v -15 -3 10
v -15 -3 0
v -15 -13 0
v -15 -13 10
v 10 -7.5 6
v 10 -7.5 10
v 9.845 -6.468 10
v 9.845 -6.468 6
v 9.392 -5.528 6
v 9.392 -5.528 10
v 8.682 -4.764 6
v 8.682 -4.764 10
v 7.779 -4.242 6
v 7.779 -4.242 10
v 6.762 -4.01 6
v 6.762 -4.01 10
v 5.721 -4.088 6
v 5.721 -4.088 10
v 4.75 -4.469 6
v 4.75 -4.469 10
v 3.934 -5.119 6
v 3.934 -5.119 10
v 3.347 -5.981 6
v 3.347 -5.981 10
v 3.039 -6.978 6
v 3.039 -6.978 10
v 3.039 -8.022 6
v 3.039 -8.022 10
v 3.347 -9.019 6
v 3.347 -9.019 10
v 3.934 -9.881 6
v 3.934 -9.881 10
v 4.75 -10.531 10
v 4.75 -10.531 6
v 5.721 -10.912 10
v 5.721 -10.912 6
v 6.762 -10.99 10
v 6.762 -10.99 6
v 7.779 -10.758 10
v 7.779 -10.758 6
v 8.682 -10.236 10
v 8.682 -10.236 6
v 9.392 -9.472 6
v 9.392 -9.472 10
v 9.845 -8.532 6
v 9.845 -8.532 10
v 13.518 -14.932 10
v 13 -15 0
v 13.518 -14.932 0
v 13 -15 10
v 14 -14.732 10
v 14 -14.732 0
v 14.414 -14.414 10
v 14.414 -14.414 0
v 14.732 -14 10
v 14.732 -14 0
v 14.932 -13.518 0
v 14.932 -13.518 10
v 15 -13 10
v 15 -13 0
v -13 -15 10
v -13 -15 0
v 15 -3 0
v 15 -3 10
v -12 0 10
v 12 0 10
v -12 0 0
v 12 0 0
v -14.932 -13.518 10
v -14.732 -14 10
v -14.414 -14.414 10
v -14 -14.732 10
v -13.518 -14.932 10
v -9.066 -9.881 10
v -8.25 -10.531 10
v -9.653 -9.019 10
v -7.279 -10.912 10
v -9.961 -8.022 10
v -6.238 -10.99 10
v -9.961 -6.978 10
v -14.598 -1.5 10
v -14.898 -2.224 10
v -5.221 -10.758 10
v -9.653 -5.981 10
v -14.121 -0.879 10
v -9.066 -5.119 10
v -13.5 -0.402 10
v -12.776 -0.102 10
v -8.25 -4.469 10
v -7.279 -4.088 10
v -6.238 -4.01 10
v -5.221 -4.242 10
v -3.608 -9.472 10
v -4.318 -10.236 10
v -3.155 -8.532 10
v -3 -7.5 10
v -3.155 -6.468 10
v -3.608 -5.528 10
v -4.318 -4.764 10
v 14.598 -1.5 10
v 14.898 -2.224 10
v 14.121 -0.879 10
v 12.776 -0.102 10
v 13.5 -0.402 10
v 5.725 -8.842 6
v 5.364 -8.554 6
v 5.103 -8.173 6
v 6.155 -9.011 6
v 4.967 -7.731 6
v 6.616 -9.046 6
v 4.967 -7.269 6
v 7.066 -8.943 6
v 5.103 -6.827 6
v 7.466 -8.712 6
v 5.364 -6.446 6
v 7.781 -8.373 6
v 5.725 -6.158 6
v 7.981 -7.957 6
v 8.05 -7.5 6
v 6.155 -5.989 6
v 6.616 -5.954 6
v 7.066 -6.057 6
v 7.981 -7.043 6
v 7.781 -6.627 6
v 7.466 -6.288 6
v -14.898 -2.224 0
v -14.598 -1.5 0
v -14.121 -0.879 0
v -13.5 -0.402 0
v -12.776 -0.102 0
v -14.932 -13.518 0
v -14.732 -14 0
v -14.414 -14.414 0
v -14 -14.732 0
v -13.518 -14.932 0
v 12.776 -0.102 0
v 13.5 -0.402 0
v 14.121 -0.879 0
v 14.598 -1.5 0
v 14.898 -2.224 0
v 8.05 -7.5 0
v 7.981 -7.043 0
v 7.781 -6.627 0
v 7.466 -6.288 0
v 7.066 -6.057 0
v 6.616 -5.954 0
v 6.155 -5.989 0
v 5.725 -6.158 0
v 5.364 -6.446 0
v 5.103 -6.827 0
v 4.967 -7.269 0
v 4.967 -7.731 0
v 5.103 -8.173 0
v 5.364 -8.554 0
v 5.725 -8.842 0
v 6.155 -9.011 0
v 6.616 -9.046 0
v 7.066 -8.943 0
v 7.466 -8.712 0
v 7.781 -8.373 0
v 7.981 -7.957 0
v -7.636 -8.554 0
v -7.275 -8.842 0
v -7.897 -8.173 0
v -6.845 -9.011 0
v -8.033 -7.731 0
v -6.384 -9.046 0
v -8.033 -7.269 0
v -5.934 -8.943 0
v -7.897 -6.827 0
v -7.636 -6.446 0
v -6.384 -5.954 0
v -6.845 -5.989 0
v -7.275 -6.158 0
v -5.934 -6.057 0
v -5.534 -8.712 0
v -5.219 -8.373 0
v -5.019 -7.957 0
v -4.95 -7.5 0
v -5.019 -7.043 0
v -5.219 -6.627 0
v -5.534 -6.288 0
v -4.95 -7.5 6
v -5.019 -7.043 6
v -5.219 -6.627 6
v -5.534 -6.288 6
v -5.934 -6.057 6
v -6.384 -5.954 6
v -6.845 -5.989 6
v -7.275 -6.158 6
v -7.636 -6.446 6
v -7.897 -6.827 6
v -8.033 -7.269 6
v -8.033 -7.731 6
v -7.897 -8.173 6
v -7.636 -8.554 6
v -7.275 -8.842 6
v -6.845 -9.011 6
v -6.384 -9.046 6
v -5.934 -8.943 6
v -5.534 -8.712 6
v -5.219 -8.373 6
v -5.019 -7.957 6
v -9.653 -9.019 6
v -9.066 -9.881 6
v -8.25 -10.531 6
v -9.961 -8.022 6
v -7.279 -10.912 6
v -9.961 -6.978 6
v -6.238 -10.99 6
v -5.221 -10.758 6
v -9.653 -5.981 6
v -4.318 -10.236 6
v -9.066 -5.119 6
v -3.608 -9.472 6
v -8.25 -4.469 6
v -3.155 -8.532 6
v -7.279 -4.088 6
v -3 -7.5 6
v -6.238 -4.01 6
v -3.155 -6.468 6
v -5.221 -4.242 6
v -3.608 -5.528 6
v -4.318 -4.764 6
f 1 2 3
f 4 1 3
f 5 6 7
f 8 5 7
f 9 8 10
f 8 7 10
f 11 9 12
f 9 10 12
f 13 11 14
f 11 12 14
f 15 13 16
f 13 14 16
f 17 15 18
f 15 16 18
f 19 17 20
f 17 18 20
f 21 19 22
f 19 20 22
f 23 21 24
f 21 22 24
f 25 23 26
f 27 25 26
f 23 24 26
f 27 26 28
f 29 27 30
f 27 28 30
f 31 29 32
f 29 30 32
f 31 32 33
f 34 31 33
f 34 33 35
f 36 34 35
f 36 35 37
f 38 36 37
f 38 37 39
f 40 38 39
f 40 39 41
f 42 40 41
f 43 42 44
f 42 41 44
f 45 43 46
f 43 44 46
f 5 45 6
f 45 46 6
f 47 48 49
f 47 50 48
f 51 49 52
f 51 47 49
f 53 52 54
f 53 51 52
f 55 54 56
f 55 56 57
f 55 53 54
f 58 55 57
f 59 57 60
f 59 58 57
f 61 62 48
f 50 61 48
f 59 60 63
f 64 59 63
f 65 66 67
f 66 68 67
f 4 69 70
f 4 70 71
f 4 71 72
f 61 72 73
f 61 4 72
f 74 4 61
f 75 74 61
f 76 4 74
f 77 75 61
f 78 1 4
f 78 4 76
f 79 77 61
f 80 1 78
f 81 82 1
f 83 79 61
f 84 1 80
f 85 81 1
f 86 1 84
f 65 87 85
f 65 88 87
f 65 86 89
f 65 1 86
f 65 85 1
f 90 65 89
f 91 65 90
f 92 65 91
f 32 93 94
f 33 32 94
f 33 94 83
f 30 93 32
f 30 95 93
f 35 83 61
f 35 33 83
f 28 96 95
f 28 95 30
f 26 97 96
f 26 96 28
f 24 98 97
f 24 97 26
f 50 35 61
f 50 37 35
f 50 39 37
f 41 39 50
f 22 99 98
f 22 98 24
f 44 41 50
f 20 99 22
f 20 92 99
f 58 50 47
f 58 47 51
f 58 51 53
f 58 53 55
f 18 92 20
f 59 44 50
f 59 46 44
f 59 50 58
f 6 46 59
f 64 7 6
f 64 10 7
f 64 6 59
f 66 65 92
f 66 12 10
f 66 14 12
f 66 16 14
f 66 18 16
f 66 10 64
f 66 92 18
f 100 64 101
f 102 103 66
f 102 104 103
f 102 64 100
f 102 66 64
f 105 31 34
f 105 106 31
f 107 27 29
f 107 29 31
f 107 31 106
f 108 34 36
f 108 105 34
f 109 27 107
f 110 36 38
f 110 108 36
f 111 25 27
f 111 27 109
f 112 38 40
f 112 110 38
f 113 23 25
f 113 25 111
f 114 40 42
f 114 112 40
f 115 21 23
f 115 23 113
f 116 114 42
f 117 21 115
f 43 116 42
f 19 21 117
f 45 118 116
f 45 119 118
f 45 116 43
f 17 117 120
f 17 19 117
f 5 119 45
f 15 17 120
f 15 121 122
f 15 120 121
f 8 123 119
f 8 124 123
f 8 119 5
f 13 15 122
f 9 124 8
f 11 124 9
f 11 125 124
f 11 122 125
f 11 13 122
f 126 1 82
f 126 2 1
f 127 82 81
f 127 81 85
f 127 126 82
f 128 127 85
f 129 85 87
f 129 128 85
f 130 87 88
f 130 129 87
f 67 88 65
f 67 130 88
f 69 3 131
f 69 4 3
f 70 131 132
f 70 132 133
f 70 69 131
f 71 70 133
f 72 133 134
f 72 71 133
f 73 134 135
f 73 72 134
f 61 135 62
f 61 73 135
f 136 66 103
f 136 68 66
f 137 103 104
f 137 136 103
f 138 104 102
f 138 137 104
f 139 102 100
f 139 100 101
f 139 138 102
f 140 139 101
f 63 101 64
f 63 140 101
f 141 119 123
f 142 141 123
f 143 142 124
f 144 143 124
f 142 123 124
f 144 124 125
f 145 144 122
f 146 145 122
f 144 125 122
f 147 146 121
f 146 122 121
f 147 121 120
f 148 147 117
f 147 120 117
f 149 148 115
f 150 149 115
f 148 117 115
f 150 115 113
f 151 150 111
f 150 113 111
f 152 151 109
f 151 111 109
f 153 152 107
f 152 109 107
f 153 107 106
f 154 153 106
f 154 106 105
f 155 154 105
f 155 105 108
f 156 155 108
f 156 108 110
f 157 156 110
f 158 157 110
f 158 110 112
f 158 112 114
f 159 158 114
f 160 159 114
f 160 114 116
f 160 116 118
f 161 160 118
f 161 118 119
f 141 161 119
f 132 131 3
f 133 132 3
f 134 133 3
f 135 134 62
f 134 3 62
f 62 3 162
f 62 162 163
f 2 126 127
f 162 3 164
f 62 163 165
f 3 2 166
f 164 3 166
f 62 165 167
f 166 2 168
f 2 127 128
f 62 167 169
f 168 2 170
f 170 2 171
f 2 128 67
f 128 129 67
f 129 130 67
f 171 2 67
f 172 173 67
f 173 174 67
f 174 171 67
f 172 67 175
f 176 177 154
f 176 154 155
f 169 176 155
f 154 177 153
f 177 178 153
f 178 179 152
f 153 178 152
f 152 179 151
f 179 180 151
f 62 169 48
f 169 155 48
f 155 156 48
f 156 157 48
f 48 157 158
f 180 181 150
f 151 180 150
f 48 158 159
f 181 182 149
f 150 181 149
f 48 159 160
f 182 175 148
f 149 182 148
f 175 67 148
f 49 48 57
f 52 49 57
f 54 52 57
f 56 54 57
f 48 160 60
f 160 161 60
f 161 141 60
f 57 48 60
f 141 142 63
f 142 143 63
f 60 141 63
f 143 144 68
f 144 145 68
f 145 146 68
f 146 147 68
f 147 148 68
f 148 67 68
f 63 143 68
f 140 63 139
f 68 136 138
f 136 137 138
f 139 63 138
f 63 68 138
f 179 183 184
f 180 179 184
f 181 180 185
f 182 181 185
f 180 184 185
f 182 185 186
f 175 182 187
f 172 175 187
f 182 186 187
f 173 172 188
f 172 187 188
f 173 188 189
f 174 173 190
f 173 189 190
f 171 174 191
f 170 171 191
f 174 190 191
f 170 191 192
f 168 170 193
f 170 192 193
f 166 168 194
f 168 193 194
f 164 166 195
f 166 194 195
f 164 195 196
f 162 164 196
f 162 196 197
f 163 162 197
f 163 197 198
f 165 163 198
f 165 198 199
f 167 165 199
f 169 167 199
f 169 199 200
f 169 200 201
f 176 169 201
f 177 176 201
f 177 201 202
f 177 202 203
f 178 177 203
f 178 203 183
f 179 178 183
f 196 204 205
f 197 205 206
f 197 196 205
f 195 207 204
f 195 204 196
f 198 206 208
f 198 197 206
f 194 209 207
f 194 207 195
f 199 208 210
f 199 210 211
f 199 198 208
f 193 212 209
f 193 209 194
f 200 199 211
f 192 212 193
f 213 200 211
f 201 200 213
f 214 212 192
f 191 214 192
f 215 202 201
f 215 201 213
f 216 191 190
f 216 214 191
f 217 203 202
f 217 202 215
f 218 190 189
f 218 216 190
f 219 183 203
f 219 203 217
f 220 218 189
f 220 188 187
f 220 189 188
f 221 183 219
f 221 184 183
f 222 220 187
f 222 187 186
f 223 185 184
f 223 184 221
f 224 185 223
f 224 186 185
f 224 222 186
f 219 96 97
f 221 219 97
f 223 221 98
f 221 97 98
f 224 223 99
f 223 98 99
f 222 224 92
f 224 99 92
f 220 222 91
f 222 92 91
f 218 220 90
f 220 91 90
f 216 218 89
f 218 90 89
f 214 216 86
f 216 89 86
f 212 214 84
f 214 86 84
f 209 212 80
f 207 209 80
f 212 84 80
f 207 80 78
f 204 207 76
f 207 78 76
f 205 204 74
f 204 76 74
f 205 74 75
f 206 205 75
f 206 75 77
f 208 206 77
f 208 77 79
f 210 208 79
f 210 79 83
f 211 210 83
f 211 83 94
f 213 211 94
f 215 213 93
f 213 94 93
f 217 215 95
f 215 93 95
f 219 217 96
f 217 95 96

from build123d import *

# Parameters (mm, degrees)
EXTRUDE_1_DEPTH          = 10
FILLET_1_R               = 2
SKETCH_2_R               = 1.55
CUT_EXTRUDE_1_DEPTH      = 11
SKETCH_3_W               = 30
SKETCH_3_H               = 5
CUT_EXTRUDE_2_DEPTH      = 1
CUT_EXTRUDE_2_DEPTH_BACK = 11
FILLET_2_R               = 3
SKETCH_5_R               = 3.5
CUT_EXTRUDE_3_DEPTH      = 4


with BuildPart() as part:
    # 草图1 → 凸台-拉伸1 (new body)
    with BuildSketch(Plane.XY):
        Polygon((7.25, 0), (-7.25, 0), (-7.25, 5), (-15, 5), (-15, -15), (15, -15), (15, 5), (7.25, 5), align=None)
    extrude(amount=EXTRUDE_1_DEPTH)

    # 圆角1
    fillet_1_edges = [part.edges().sort_by_distance(p)[0] for p in [
        (15, 5, 5),
        (15, -15, 5),
        (-15, -15, 5),
        (-15, 5, 5),
    ]]
    fillet(fillet_1_edges, radius=FILLET_1_R)

    # 草图2 → 切除-拉伸1 (cut, through all)
    with BuildSketch(Plane.XY.offset(10)):
        with Locations((-6.5, -7.5)):
            Circle(SKETCH_2_R)
        with Locations((6.5, -7.5)):
            Circle(SKETCH_2_R)
    extrude(amount=-CUT_EXTRUDE_1_DEPTH, mode=Mode.SUBTRACT)

    # 草图3 → 切除-拉伸2 (cut, two sides)
    with BuildSketch(Plane.XY.offset(10)) as cut_extrude_2_sk:
        with Locations((0, 2.5)):
            Rectangle(SKETCH_3_W, SKETCH_3_H)
    extrude(amount=CUT_EXTRUDE_2_DEPTH, mode=Mode.SUBTRACT)
    extrude(cut_extrude_2_sk.sketch, amount=-CUT_EXTRUDE_2_DEPTH_BACK, mode=Mode.SUBTRACT)

    # 圆角2
    fillet_2_edges = [part.edges().sort_by_distance(p)[0] for p in [
        (15, 0, 5),
        (-15, 0, 5),
    ]]
    fillet(fillet_2_edges, radius=FILLET_2_R)

    # 草图5 → 切除-拉伸3 (cut)
    with BuildSketch(Plane.XY.offset(10)):
        with Locations((-6.5, -7.500000001)):
            Circle(SKETCH_5_R)
        with Locations((6.5, -7.5)):
            Circle(SKETCH_5_R)
    extrude(amount=-CUT_EXTRUDE_3_DEPTH, mode=Mode.SUBTRACT)


solid = part.part
